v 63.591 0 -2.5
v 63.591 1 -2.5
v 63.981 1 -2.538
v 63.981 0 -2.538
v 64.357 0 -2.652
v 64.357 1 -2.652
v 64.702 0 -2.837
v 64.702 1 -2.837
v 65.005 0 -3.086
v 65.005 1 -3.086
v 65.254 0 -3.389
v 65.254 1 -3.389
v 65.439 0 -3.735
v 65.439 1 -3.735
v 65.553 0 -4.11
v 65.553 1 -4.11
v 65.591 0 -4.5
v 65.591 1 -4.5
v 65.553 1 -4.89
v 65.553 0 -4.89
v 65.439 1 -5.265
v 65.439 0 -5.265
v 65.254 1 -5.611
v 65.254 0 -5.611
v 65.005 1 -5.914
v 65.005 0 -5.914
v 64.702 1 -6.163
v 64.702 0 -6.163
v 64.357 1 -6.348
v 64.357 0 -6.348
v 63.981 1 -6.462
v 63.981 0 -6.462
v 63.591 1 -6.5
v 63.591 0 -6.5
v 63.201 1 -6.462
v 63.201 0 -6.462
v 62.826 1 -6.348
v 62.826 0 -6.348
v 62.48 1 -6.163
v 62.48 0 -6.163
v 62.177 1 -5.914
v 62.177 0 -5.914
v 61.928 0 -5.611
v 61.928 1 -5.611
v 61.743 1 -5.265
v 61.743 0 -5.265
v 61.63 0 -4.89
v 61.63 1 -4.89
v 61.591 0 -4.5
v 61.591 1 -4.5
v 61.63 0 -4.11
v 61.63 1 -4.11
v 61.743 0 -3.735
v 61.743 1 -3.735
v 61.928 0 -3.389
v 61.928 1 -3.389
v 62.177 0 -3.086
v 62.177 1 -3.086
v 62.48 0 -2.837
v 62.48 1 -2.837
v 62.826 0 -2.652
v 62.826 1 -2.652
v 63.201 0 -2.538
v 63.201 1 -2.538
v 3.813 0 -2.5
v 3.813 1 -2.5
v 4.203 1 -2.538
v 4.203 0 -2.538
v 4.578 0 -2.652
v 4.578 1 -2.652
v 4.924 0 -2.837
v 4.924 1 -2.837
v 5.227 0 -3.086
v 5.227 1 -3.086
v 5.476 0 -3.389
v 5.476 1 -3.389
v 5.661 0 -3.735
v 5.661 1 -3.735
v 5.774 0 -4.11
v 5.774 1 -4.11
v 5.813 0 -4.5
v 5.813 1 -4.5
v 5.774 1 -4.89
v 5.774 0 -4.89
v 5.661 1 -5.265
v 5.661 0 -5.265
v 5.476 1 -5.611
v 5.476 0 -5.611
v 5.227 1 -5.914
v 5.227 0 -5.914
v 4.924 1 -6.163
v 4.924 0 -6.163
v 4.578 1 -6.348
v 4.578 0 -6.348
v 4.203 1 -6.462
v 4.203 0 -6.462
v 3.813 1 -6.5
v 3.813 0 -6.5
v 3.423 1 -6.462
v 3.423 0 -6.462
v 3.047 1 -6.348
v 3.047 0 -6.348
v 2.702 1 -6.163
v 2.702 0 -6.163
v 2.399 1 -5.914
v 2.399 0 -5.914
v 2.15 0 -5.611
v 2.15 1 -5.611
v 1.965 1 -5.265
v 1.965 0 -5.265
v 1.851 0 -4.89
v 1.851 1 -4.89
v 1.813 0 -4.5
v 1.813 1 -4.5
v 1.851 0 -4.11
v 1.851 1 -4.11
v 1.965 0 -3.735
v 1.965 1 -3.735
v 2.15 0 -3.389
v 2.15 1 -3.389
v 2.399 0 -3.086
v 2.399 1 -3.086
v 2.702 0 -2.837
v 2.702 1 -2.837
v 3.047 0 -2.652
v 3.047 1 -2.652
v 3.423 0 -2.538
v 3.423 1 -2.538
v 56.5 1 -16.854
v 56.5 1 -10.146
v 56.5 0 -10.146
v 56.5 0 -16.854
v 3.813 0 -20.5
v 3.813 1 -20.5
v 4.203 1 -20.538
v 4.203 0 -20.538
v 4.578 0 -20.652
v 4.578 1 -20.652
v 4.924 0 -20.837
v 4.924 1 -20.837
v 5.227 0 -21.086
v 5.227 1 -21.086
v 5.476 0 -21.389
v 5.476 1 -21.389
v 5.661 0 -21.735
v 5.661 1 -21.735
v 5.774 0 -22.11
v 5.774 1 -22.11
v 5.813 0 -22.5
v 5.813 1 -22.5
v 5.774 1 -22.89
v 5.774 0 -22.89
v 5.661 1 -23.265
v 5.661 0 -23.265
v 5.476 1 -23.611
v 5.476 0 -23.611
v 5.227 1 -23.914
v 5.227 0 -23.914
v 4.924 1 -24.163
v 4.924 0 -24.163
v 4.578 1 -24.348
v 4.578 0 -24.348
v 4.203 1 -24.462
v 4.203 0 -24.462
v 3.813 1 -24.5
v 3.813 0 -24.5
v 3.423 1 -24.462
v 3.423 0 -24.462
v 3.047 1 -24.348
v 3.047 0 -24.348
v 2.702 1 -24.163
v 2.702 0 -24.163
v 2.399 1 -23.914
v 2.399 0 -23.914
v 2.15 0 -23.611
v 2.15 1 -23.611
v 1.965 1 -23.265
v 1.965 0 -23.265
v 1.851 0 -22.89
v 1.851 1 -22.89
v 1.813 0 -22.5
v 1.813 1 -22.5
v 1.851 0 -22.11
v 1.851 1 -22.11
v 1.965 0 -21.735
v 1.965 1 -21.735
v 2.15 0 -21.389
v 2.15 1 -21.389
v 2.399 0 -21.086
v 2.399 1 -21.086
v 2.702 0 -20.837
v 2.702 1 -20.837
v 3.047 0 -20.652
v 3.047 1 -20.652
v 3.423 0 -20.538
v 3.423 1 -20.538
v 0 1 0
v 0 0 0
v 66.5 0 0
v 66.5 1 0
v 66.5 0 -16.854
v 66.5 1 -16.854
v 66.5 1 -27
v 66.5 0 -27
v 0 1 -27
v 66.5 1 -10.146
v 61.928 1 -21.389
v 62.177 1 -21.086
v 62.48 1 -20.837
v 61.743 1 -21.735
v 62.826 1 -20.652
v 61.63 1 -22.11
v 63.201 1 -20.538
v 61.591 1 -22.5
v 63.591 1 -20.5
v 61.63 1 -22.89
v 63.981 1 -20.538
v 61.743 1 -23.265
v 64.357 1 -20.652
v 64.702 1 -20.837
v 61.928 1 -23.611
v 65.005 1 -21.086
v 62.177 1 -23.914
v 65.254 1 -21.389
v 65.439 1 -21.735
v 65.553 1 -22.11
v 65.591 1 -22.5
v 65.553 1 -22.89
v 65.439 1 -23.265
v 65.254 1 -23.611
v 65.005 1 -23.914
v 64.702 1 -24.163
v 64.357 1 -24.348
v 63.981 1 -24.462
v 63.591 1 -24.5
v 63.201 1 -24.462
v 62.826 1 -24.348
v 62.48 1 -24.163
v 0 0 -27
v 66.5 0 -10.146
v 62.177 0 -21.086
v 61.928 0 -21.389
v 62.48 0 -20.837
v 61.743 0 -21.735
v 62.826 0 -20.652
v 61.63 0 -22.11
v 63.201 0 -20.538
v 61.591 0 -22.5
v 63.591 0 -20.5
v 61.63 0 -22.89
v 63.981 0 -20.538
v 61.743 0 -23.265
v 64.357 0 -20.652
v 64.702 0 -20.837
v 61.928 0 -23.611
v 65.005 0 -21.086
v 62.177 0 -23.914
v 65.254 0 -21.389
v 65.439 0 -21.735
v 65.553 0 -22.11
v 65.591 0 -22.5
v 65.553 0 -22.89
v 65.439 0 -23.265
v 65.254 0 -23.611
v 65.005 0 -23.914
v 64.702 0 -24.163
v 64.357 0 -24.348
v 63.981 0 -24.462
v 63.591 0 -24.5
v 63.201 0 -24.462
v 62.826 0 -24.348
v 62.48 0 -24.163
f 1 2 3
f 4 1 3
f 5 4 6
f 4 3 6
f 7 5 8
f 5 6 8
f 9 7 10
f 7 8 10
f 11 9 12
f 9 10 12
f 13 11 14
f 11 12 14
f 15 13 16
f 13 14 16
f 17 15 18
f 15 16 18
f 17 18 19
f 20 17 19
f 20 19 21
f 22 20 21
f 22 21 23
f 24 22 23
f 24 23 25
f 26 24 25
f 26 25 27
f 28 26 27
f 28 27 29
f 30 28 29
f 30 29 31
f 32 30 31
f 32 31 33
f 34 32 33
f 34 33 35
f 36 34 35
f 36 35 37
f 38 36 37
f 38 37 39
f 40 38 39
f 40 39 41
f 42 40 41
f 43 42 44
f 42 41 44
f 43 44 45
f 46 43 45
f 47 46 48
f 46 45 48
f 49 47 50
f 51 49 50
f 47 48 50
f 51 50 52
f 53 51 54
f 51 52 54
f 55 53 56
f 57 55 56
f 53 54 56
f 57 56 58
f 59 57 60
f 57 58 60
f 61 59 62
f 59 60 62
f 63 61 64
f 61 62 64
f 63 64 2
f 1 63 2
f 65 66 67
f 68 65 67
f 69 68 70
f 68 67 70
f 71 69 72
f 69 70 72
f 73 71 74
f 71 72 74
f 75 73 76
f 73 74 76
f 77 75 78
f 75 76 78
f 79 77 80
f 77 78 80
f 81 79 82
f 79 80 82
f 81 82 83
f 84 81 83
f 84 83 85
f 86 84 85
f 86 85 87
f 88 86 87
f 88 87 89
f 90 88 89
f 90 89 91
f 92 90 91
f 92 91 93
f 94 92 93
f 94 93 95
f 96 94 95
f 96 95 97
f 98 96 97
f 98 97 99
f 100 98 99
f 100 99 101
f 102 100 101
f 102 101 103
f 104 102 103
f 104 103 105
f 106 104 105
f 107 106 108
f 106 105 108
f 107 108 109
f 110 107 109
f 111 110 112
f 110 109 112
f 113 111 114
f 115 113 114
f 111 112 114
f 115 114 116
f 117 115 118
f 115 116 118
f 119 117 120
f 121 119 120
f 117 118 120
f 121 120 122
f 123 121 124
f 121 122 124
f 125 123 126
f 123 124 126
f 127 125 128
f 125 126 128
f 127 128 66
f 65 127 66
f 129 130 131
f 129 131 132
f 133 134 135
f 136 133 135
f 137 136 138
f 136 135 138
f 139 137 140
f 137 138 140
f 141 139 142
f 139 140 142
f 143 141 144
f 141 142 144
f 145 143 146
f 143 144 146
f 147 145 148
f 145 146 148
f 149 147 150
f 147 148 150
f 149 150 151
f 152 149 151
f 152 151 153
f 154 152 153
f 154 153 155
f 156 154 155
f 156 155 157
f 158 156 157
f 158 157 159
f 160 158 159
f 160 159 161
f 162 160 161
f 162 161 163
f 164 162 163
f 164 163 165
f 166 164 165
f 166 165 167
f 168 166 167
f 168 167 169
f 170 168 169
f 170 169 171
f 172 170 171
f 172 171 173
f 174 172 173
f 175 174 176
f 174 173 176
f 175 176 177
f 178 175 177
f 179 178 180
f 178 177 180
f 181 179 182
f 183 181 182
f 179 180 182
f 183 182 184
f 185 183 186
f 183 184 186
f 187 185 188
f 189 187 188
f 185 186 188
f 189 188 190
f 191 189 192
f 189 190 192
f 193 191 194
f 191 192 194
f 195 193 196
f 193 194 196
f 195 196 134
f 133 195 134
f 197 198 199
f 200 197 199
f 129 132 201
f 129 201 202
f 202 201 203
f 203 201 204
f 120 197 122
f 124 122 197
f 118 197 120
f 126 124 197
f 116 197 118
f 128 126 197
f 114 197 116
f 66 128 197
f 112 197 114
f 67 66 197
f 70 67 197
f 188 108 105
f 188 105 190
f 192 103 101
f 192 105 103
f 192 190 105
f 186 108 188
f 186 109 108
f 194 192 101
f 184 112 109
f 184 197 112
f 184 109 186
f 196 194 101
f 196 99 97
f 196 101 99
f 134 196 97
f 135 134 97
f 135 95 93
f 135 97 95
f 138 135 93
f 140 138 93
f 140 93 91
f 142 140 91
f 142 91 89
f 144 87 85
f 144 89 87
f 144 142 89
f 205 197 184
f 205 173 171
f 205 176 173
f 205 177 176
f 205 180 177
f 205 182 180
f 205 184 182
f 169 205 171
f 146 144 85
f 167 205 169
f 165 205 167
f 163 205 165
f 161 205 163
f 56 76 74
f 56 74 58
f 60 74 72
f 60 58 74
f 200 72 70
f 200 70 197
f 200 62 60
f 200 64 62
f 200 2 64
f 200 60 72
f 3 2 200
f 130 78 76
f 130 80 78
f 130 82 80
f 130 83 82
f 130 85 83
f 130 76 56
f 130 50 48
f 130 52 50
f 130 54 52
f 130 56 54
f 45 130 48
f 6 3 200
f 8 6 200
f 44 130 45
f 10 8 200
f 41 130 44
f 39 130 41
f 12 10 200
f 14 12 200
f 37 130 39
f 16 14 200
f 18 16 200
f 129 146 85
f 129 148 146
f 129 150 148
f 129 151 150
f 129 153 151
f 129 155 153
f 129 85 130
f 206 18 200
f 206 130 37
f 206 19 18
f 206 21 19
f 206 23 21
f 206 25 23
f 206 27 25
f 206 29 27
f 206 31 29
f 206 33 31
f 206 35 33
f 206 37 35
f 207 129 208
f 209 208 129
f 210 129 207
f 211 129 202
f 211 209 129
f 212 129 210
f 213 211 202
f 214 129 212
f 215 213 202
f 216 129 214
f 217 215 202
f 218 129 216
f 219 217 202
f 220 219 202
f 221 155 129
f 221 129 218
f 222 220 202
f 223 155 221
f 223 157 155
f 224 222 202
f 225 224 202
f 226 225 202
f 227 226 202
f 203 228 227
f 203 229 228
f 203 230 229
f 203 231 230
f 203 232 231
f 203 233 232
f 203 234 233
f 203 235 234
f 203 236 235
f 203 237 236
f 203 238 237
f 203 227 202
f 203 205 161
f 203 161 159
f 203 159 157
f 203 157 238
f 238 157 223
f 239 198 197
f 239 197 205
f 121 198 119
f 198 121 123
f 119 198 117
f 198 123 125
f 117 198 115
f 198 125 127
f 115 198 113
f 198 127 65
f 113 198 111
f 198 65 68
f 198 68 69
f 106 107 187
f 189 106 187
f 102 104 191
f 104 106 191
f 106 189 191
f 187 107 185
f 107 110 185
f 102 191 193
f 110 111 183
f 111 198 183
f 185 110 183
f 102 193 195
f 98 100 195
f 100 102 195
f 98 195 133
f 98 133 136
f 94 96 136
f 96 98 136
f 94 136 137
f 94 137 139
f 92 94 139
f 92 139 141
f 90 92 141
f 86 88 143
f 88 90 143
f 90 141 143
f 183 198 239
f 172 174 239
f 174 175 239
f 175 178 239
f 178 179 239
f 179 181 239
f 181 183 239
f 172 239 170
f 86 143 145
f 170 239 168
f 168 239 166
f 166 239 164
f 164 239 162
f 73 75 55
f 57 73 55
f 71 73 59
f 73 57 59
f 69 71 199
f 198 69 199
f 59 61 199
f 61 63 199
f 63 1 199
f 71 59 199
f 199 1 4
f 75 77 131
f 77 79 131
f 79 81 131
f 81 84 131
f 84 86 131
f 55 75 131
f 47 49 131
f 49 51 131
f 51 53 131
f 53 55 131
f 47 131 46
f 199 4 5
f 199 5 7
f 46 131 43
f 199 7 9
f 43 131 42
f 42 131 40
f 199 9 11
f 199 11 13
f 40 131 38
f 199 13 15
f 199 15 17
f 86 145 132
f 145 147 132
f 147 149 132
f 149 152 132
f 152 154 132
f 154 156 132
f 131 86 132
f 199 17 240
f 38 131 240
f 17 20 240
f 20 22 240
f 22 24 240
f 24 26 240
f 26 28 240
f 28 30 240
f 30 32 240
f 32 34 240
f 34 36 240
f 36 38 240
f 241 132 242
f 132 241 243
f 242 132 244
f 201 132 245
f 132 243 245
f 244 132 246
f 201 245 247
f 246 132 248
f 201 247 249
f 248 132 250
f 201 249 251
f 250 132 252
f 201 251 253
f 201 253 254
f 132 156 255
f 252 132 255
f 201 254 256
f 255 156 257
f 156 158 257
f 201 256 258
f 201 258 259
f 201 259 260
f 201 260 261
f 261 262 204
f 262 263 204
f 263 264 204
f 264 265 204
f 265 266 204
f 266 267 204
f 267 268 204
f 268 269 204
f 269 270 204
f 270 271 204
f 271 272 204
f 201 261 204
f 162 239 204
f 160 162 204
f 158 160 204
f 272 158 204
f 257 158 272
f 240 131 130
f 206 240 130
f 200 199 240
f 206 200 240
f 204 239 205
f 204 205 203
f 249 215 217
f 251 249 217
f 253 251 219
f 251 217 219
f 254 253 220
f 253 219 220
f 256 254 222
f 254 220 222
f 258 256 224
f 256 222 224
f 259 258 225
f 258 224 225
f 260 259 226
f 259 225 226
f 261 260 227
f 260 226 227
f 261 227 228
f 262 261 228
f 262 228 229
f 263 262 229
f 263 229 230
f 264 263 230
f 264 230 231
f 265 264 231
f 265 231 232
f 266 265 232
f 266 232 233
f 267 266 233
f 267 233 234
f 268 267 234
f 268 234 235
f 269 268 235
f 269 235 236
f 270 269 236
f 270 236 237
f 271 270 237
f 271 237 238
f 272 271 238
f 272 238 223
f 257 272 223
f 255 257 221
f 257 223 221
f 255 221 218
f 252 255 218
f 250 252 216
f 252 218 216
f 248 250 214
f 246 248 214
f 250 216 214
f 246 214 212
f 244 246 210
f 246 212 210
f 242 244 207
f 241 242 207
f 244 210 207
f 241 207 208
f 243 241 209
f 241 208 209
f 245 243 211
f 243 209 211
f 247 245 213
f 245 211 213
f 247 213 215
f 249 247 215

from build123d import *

# Parameters (mm, degrees)
SKETCH1_W               = 66.5
SKETCH1_H               = 27
BOSS_EXTRUDE1_DEPTH     = 1
CUT_EXTRUDE1_DEPTH      = 72.779175253
CUT_EXTRUDE1_DEPTH_BACK = 10
SKETCH2_W               = 6.707780704
SKETCH2_H               = 1
SKETCH3_R               = 2
CUT_EXTRUDE2_DEPTH      = 72.779175253


with BuildPart() as part:
    # Sketch1 → Boss-Extrude1 (new body)
    with BuildSketch(Plane(origin=(0, 0, 0), x_dir=(1, 0, 0), z_dir=(0, 1, 0))):
        with Locations((33.25, 13.5)):
            Rectangle(SKETCH1_W, SKETCH1_H)
    extrude(amount=BOSS_EXTRUDE1_DEPTH)

    # Sketch2 → Cut-Extrude1 (cut, two sides: drawn at the far end of the back side and taken through both)
    with BuildSketch(Plane(origin=(66.5, 0, 0), x_dir=(0, 0, -1), z_dir=(1, 0, 0)).offset(-CUT_EXTRUDE1_DEPTH_BACK)):
        with Locations((13.5, 0.5)):
            Rectangle(SKETCH2_W, SKETCH2_H)
    extrude(amount=CUT_EXTRUDE1_DEPTH + CUT_EXTRUDE1_DEPTH_BACK, mode=Mode.SUBTRACT)

    # Sketch3 → Cut-Extrude2 (cut, through all)
    with BuildSketch(Plane(origin=(0, 1, 0), x_dir=(1, 0, 0), z_dir=(0, 1, 0))):
        with Locations(Location((63.591245105, 4.5, 0), (0, 0, 270))):
            Circle(SKETCH3_R)
        with Locations(Location((63.591245105, 22.5, 0), (0, 0, 270))):
            Circle(SKETCH3_R)
        with Locations(Location((3.812777096, 22.5, 0), (0, 0, 270))):
            Circle(SKETCH3_R)
        with Locations(Location((3.812777096, 4.5, 0), (0, 0, 270))):
            Circle(SKETCH3_R)
    extrude(amount=-CUT_EXTRUDE2_DEPTH, mode=Mode.SUBTRACT)


solid = part.part
